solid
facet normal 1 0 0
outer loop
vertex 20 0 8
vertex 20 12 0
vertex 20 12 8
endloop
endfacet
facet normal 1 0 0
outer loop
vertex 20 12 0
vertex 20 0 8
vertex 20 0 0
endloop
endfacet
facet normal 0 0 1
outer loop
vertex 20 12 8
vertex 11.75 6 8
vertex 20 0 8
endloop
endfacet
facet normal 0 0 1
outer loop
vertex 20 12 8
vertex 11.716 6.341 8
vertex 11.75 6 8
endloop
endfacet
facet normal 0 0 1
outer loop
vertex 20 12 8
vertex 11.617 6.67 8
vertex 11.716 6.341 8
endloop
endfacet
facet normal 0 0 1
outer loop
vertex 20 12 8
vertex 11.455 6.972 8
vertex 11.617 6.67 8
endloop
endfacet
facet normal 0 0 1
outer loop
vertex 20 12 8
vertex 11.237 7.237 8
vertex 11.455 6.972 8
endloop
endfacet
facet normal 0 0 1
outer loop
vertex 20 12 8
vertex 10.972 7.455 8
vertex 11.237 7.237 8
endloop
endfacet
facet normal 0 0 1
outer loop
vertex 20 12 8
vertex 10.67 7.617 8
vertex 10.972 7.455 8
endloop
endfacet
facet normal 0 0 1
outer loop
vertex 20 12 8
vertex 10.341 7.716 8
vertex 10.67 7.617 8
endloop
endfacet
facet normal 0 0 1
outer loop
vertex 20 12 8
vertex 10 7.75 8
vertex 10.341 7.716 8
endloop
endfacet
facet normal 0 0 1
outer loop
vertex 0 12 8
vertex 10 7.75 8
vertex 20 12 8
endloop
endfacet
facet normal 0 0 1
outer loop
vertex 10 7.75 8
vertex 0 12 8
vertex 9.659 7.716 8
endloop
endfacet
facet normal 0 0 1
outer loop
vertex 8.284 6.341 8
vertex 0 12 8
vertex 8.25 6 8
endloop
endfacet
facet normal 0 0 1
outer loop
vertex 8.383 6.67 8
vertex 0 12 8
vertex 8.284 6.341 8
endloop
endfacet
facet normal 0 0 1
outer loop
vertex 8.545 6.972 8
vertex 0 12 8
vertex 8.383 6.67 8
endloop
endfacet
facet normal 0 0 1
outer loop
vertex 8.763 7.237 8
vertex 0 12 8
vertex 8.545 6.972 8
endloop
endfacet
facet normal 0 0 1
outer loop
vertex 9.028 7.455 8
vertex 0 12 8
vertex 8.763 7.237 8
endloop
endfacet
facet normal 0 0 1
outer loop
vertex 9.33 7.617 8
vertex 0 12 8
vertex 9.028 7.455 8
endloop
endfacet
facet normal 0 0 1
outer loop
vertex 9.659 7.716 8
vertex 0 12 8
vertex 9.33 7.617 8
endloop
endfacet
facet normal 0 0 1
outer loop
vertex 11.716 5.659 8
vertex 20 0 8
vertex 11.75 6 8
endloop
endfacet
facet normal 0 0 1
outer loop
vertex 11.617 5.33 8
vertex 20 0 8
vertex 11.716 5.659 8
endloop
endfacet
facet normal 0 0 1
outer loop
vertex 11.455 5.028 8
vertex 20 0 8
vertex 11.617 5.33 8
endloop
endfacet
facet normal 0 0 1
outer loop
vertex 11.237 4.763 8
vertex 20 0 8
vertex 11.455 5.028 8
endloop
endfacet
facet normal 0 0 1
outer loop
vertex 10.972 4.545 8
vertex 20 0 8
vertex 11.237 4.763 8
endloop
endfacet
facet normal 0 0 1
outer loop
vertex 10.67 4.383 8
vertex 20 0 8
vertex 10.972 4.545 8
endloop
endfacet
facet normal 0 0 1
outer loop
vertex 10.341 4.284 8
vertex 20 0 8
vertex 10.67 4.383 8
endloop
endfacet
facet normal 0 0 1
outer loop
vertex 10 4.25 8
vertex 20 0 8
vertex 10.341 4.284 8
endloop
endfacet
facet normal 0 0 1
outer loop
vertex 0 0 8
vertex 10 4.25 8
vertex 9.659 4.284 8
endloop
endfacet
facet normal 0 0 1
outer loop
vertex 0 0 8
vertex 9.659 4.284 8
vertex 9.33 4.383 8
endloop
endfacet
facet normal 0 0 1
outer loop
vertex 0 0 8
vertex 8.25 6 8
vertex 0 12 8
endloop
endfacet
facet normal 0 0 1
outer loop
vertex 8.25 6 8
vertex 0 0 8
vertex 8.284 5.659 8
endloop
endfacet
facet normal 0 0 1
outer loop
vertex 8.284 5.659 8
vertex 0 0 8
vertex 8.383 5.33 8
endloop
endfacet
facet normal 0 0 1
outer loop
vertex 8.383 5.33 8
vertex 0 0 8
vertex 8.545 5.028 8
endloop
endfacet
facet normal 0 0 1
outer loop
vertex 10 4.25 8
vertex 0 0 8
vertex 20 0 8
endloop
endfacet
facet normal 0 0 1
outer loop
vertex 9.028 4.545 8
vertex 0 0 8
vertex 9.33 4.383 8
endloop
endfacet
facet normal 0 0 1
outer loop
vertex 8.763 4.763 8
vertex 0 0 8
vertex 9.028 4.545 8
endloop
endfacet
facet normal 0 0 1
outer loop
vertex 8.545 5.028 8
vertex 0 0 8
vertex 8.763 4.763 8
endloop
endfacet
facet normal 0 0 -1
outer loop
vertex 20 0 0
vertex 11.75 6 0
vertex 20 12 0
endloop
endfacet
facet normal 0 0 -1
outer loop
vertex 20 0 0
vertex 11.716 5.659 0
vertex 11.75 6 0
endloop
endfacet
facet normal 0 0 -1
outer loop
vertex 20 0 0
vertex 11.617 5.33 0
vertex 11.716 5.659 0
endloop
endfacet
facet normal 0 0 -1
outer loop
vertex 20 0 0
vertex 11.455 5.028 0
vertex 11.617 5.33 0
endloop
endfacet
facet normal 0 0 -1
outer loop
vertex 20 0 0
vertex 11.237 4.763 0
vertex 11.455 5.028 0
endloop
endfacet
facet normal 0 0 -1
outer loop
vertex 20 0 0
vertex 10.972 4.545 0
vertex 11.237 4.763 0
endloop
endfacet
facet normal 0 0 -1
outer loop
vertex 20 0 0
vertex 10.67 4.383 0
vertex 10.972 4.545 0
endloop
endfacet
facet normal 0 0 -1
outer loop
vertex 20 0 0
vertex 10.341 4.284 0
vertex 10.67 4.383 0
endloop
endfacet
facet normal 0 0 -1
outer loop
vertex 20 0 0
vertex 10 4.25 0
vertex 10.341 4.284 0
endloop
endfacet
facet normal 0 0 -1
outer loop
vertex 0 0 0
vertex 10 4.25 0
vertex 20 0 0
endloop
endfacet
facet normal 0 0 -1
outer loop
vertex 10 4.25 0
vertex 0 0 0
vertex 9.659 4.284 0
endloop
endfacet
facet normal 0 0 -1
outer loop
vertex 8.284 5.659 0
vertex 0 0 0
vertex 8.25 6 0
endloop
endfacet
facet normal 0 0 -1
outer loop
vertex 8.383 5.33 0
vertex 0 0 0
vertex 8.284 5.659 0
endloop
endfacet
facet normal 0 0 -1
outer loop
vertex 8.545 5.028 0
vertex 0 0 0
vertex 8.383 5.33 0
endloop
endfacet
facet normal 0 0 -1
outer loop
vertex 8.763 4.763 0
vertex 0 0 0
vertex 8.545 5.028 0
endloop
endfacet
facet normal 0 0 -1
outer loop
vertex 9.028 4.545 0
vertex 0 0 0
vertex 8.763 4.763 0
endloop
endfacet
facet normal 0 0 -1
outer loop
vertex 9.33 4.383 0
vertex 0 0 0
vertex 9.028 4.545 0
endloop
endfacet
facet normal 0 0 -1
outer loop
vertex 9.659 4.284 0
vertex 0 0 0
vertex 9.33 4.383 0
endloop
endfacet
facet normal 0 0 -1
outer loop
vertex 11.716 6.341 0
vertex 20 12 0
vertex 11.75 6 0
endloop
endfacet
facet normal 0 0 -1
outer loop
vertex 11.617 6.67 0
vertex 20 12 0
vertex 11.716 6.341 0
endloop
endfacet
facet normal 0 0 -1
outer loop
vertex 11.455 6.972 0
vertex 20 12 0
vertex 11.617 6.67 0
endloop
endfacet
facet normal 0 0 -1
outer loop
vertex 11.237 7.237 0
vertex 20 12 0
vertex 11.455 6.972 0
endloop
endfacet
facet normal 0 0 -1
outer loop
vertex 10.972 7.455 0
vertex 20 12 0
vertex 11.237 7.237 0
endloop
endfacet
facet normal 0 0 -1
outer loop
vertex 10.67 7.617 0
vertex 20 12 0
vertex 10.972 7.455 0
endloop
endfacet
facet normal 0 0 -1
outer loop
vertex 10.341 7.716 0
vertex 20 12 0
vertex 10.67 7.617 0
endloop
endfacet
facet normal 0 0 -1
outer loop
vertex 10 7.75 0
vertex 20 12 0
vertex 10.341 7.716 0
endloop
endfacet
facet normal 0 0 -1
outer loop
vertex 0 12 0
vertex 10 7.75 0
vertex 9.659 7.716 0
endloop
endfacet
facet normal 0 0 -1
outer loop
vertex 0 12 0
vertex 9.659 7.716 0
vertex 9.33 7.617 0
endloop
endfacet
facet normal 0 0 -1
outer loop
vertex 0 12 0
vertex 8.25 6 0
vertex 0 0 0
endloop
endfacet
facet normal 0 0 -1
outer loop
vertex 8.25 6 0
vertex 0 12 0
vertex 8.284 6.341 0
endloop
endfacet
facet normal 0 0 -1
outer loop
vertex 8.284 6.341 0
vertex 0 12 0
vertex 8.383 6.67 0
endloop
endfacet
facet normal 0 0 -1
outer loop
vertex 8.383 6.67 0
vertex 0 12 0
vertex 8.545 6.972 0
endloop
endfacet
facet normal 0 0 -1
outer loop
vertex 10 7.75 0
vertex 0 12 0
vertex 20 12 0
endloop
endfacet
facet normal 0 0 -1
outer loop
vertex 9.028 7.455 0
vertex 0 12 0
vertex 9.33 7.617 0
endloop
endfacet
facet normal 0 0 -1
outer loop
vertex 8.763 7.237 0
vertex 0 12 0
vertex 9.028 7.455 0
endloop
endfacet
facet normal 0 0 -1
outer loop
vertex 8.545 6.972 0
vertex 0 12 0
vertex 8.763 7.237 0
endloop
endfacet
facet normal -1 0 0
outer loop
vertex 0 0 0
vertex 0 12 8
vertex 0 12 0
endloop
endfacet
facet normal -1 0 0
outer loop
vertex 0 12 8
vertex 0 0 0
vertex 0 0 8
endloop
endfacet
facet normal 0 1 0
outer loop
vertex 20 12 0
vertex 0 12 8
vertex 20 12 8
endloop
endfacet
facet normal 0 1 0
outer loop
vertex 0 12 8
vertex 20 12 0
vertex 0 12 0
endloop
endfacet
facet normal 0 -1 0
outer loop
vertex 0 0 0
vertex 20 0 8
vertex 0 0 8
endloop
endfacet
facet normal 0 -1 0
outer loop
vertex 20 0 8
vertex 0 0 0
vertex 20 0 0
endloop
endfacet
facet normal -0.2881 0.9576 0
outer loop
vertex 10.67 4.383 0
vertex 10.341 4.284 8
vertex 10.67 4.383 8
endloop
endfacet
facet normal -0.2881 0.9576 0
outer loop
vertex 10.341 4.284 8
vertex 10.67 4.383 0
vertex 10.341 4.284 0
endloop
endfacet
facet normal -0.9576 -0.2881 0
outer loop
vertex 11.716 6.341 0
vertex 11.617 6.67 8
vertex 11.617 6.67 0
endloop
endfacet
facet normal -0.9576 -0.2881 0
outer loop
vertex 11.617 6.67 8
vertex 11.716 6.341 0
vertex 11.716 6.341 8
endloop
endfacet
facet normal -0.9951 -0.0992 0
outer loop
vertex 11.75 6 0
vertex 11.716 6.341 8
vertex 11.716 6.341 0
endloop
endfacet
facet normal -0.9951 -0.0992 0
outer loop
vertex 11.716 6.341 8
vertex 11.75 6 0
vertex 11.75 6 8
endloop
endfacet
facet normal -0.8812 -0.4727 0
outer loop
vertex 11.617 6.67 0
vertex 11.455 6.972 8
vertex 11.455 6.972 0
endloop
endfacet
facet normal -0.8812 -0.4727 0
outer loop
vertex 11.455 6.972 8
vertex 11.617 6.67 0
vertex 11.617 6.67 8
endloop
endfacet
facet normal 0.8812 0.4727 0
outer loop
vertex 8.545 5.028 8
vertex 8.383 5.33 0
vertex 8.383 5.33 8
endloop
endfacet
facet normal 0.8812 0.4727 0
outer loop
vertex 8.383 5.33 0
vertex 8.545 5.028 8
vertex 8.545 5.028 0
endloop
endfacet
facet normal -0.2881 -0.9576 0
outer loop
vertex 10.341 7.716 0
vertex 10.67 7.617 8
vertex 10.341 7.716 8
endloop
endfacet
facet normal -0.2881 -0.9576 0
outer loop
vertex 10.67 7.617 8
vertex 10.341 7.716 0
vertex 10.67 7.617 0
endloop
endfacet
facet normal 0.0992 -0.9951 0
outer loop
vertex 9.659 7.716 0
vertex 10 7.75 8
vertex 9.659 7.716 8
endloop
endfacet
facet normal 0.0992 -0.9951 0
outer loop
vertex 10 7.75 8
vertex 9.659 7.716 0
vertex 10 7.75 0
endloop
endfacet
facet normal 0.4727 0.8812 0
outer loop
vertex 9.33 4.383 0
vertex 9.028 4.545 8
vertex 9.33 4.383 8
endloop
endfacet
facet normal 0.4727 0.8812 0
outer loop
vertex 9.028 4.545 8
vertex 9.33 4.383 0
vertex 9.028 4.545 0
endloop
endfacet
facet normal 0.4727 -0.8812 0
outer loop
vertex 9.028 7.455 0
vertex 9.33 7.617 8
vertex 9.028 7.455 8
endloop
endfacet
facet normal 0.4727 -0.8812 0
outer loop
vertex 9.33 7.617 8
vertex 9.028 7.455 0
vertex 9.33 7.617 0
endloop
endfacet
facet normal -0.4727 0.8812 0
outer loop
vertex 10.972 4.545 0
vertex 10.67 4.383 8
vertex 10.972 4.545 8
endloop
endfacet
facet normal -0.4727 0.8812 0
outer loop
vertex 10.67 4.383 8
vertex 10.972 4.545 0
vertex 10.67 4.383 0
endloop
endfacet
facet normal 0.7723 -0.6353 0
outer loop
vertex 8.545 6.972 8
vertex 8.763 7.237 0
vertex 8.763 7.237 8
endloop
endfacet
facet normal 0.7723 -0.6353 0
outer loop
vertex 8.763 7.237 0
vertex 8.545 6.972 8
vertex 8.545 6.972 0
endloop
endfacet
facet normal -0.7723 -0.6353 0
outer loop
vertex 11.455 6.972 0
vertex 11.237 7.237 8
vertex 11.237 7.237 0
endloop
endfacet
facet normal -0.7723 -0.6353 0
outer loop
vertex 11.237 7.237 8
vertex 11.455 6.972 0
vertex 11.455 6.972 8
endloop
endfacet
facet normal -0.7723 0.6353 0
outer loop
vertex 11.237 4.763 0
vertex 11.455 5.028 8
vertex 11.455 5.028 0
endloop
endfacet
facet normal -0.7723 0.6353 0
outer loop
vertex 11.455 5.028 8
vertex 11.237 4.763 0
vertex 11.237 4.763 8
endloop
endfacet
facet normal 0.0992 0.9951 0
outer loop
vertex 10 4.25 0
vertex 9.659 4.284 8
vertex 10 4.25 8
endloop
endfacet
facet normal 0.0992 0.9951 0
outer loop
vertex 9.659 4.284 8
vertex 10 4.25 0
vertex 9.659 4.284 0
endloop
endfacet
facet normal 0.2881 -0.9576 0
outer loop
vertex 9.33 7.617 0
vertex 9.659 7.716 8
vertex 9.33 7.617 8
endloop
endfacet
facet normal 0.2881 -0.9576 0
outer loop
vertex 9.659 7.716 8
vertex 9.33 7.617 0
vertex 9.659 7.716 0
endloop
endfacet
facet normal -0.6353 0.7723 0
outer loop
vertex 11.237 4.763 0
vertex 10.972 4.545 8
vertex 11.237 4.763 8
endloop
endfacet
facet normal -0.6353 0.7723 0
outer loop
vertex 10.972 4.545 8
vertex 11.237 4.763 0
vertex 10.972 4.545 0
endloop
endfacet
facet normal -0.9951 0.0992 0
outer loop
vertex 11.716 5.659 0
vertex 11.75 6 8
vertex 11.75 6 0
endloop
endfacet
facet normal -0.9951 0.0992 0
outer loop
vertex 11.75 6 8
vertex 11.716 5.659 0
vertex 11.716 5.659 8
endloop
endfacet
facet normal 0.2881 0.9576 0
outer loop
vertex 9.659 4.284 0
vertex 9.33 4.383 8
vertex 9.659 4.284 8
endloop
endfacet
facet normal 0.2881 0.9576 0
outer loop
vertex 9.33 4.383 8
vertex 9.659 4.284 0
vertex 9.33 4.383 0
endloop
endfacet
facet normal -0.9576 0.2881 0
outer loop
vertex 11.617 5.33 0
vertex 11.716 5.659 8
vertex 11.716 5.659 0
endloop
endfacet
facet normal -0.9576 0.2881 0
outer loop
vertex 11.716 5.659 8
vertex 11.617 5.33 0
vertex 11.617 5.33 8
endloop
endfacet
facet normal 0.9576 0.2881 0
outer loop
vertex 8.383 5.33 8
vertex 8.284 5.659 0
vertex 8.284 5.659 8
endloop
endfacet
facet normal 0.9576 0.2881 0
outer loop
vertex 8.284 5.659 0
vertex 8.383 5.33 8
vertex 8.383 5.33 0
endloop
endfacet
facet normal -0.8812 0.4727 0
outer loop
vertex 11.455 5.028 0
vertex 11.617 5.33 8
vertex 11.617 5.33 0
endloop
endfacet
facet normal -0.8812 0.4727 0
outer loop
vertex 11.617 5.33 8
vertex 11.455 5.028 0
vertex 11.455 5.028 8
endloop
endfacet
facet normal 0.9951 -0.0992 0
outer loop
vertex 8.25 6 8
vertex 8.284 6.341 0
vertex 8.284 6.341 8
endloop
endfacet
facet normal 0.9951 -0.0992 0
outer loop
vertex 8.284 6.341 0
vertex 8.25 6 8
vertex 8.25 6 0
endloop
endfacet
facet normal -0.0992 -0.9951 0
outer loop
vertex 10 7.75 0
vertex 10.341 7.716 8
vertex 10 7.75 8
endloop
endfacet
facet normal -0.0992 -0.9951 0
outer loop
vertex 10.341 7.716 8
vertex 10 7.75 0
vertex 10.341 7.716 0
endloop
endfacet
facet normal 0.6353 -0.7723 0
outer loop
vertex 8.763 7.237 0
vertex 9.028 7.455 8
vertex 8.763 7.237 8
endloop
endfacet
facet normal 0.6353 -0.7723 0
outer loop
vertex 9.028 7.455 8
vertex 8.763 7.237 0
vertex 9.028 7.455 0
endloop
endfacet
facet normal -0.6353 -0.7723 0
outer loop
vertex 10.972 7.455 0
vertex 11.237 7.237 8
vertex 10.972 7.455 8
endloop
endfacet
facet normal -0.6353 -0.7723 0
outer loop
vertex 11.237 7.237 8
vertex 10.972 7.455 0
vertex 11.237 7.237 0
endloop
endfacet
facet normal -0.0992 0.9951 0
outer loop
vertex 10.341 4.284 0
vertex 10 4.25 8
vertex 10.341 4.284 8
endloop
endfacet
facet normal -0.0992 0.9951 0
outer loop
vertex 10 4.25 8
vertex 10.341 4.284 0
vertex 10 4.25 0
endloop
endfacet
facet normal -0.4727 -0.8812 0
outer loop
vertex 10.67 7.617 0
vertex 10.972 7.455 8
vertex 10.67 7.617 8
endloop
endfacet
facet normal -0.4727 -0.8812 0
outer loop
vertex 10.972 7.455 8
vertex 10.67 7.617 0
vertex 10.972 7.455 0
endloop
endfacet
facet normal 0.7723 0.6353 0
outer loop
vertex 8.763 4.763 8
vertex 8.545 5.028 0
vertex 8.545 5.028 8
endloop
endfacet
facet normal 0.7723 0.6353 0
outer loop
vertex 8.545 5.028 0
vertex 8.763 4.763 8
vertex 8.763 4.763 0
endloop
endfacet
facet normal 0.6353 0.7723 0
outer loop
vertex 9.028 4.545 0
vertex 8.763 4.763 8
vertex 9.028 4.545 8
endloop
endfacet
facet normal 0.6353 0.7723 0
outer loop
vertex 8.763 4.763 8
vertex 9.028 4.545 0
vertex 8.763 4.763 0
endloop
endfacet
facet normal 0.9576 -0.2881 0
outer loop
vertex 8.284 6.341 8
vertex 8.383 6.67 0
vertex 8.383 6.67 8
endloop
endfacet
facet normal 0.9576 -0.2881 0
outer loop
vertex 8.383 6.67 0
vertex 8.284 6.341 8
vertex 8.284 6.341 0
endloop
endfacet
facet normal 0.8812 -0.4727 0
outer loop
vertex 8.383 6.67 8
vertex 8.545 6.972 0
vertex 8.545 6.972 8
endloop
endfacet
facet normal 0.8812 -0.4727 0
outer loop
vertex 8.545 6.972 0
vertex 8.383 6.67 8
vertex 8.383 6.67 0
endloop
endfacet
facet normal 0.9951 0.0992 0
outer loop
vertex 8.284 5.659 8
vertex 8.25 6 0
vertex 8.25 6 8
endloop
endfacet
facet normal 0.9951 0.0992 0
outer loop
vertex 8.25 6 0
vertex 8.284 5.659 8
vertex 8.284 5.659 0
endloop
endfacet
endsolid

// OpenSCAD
$fn = 32;

// ----------------------------------------------------------------------
// Micro pad: drilled pad, 5-20 mm class
// ----------------------------------------------------------------------

// --- parameters (mm) ---
pad_l = 20;               // pad length, X
pad_w = 12;               // pad width, Y
pad_t = 8;                // pad thickness, Z
hole_d = 3.5;             // through hole diameter

difference() {
  cube([pad_l, pad_w, pad_t]);
  translate([pad_l / 2, pad_w / 2, -1])
    cylinder(h = pad_t + 2, d = hole_d);
}
